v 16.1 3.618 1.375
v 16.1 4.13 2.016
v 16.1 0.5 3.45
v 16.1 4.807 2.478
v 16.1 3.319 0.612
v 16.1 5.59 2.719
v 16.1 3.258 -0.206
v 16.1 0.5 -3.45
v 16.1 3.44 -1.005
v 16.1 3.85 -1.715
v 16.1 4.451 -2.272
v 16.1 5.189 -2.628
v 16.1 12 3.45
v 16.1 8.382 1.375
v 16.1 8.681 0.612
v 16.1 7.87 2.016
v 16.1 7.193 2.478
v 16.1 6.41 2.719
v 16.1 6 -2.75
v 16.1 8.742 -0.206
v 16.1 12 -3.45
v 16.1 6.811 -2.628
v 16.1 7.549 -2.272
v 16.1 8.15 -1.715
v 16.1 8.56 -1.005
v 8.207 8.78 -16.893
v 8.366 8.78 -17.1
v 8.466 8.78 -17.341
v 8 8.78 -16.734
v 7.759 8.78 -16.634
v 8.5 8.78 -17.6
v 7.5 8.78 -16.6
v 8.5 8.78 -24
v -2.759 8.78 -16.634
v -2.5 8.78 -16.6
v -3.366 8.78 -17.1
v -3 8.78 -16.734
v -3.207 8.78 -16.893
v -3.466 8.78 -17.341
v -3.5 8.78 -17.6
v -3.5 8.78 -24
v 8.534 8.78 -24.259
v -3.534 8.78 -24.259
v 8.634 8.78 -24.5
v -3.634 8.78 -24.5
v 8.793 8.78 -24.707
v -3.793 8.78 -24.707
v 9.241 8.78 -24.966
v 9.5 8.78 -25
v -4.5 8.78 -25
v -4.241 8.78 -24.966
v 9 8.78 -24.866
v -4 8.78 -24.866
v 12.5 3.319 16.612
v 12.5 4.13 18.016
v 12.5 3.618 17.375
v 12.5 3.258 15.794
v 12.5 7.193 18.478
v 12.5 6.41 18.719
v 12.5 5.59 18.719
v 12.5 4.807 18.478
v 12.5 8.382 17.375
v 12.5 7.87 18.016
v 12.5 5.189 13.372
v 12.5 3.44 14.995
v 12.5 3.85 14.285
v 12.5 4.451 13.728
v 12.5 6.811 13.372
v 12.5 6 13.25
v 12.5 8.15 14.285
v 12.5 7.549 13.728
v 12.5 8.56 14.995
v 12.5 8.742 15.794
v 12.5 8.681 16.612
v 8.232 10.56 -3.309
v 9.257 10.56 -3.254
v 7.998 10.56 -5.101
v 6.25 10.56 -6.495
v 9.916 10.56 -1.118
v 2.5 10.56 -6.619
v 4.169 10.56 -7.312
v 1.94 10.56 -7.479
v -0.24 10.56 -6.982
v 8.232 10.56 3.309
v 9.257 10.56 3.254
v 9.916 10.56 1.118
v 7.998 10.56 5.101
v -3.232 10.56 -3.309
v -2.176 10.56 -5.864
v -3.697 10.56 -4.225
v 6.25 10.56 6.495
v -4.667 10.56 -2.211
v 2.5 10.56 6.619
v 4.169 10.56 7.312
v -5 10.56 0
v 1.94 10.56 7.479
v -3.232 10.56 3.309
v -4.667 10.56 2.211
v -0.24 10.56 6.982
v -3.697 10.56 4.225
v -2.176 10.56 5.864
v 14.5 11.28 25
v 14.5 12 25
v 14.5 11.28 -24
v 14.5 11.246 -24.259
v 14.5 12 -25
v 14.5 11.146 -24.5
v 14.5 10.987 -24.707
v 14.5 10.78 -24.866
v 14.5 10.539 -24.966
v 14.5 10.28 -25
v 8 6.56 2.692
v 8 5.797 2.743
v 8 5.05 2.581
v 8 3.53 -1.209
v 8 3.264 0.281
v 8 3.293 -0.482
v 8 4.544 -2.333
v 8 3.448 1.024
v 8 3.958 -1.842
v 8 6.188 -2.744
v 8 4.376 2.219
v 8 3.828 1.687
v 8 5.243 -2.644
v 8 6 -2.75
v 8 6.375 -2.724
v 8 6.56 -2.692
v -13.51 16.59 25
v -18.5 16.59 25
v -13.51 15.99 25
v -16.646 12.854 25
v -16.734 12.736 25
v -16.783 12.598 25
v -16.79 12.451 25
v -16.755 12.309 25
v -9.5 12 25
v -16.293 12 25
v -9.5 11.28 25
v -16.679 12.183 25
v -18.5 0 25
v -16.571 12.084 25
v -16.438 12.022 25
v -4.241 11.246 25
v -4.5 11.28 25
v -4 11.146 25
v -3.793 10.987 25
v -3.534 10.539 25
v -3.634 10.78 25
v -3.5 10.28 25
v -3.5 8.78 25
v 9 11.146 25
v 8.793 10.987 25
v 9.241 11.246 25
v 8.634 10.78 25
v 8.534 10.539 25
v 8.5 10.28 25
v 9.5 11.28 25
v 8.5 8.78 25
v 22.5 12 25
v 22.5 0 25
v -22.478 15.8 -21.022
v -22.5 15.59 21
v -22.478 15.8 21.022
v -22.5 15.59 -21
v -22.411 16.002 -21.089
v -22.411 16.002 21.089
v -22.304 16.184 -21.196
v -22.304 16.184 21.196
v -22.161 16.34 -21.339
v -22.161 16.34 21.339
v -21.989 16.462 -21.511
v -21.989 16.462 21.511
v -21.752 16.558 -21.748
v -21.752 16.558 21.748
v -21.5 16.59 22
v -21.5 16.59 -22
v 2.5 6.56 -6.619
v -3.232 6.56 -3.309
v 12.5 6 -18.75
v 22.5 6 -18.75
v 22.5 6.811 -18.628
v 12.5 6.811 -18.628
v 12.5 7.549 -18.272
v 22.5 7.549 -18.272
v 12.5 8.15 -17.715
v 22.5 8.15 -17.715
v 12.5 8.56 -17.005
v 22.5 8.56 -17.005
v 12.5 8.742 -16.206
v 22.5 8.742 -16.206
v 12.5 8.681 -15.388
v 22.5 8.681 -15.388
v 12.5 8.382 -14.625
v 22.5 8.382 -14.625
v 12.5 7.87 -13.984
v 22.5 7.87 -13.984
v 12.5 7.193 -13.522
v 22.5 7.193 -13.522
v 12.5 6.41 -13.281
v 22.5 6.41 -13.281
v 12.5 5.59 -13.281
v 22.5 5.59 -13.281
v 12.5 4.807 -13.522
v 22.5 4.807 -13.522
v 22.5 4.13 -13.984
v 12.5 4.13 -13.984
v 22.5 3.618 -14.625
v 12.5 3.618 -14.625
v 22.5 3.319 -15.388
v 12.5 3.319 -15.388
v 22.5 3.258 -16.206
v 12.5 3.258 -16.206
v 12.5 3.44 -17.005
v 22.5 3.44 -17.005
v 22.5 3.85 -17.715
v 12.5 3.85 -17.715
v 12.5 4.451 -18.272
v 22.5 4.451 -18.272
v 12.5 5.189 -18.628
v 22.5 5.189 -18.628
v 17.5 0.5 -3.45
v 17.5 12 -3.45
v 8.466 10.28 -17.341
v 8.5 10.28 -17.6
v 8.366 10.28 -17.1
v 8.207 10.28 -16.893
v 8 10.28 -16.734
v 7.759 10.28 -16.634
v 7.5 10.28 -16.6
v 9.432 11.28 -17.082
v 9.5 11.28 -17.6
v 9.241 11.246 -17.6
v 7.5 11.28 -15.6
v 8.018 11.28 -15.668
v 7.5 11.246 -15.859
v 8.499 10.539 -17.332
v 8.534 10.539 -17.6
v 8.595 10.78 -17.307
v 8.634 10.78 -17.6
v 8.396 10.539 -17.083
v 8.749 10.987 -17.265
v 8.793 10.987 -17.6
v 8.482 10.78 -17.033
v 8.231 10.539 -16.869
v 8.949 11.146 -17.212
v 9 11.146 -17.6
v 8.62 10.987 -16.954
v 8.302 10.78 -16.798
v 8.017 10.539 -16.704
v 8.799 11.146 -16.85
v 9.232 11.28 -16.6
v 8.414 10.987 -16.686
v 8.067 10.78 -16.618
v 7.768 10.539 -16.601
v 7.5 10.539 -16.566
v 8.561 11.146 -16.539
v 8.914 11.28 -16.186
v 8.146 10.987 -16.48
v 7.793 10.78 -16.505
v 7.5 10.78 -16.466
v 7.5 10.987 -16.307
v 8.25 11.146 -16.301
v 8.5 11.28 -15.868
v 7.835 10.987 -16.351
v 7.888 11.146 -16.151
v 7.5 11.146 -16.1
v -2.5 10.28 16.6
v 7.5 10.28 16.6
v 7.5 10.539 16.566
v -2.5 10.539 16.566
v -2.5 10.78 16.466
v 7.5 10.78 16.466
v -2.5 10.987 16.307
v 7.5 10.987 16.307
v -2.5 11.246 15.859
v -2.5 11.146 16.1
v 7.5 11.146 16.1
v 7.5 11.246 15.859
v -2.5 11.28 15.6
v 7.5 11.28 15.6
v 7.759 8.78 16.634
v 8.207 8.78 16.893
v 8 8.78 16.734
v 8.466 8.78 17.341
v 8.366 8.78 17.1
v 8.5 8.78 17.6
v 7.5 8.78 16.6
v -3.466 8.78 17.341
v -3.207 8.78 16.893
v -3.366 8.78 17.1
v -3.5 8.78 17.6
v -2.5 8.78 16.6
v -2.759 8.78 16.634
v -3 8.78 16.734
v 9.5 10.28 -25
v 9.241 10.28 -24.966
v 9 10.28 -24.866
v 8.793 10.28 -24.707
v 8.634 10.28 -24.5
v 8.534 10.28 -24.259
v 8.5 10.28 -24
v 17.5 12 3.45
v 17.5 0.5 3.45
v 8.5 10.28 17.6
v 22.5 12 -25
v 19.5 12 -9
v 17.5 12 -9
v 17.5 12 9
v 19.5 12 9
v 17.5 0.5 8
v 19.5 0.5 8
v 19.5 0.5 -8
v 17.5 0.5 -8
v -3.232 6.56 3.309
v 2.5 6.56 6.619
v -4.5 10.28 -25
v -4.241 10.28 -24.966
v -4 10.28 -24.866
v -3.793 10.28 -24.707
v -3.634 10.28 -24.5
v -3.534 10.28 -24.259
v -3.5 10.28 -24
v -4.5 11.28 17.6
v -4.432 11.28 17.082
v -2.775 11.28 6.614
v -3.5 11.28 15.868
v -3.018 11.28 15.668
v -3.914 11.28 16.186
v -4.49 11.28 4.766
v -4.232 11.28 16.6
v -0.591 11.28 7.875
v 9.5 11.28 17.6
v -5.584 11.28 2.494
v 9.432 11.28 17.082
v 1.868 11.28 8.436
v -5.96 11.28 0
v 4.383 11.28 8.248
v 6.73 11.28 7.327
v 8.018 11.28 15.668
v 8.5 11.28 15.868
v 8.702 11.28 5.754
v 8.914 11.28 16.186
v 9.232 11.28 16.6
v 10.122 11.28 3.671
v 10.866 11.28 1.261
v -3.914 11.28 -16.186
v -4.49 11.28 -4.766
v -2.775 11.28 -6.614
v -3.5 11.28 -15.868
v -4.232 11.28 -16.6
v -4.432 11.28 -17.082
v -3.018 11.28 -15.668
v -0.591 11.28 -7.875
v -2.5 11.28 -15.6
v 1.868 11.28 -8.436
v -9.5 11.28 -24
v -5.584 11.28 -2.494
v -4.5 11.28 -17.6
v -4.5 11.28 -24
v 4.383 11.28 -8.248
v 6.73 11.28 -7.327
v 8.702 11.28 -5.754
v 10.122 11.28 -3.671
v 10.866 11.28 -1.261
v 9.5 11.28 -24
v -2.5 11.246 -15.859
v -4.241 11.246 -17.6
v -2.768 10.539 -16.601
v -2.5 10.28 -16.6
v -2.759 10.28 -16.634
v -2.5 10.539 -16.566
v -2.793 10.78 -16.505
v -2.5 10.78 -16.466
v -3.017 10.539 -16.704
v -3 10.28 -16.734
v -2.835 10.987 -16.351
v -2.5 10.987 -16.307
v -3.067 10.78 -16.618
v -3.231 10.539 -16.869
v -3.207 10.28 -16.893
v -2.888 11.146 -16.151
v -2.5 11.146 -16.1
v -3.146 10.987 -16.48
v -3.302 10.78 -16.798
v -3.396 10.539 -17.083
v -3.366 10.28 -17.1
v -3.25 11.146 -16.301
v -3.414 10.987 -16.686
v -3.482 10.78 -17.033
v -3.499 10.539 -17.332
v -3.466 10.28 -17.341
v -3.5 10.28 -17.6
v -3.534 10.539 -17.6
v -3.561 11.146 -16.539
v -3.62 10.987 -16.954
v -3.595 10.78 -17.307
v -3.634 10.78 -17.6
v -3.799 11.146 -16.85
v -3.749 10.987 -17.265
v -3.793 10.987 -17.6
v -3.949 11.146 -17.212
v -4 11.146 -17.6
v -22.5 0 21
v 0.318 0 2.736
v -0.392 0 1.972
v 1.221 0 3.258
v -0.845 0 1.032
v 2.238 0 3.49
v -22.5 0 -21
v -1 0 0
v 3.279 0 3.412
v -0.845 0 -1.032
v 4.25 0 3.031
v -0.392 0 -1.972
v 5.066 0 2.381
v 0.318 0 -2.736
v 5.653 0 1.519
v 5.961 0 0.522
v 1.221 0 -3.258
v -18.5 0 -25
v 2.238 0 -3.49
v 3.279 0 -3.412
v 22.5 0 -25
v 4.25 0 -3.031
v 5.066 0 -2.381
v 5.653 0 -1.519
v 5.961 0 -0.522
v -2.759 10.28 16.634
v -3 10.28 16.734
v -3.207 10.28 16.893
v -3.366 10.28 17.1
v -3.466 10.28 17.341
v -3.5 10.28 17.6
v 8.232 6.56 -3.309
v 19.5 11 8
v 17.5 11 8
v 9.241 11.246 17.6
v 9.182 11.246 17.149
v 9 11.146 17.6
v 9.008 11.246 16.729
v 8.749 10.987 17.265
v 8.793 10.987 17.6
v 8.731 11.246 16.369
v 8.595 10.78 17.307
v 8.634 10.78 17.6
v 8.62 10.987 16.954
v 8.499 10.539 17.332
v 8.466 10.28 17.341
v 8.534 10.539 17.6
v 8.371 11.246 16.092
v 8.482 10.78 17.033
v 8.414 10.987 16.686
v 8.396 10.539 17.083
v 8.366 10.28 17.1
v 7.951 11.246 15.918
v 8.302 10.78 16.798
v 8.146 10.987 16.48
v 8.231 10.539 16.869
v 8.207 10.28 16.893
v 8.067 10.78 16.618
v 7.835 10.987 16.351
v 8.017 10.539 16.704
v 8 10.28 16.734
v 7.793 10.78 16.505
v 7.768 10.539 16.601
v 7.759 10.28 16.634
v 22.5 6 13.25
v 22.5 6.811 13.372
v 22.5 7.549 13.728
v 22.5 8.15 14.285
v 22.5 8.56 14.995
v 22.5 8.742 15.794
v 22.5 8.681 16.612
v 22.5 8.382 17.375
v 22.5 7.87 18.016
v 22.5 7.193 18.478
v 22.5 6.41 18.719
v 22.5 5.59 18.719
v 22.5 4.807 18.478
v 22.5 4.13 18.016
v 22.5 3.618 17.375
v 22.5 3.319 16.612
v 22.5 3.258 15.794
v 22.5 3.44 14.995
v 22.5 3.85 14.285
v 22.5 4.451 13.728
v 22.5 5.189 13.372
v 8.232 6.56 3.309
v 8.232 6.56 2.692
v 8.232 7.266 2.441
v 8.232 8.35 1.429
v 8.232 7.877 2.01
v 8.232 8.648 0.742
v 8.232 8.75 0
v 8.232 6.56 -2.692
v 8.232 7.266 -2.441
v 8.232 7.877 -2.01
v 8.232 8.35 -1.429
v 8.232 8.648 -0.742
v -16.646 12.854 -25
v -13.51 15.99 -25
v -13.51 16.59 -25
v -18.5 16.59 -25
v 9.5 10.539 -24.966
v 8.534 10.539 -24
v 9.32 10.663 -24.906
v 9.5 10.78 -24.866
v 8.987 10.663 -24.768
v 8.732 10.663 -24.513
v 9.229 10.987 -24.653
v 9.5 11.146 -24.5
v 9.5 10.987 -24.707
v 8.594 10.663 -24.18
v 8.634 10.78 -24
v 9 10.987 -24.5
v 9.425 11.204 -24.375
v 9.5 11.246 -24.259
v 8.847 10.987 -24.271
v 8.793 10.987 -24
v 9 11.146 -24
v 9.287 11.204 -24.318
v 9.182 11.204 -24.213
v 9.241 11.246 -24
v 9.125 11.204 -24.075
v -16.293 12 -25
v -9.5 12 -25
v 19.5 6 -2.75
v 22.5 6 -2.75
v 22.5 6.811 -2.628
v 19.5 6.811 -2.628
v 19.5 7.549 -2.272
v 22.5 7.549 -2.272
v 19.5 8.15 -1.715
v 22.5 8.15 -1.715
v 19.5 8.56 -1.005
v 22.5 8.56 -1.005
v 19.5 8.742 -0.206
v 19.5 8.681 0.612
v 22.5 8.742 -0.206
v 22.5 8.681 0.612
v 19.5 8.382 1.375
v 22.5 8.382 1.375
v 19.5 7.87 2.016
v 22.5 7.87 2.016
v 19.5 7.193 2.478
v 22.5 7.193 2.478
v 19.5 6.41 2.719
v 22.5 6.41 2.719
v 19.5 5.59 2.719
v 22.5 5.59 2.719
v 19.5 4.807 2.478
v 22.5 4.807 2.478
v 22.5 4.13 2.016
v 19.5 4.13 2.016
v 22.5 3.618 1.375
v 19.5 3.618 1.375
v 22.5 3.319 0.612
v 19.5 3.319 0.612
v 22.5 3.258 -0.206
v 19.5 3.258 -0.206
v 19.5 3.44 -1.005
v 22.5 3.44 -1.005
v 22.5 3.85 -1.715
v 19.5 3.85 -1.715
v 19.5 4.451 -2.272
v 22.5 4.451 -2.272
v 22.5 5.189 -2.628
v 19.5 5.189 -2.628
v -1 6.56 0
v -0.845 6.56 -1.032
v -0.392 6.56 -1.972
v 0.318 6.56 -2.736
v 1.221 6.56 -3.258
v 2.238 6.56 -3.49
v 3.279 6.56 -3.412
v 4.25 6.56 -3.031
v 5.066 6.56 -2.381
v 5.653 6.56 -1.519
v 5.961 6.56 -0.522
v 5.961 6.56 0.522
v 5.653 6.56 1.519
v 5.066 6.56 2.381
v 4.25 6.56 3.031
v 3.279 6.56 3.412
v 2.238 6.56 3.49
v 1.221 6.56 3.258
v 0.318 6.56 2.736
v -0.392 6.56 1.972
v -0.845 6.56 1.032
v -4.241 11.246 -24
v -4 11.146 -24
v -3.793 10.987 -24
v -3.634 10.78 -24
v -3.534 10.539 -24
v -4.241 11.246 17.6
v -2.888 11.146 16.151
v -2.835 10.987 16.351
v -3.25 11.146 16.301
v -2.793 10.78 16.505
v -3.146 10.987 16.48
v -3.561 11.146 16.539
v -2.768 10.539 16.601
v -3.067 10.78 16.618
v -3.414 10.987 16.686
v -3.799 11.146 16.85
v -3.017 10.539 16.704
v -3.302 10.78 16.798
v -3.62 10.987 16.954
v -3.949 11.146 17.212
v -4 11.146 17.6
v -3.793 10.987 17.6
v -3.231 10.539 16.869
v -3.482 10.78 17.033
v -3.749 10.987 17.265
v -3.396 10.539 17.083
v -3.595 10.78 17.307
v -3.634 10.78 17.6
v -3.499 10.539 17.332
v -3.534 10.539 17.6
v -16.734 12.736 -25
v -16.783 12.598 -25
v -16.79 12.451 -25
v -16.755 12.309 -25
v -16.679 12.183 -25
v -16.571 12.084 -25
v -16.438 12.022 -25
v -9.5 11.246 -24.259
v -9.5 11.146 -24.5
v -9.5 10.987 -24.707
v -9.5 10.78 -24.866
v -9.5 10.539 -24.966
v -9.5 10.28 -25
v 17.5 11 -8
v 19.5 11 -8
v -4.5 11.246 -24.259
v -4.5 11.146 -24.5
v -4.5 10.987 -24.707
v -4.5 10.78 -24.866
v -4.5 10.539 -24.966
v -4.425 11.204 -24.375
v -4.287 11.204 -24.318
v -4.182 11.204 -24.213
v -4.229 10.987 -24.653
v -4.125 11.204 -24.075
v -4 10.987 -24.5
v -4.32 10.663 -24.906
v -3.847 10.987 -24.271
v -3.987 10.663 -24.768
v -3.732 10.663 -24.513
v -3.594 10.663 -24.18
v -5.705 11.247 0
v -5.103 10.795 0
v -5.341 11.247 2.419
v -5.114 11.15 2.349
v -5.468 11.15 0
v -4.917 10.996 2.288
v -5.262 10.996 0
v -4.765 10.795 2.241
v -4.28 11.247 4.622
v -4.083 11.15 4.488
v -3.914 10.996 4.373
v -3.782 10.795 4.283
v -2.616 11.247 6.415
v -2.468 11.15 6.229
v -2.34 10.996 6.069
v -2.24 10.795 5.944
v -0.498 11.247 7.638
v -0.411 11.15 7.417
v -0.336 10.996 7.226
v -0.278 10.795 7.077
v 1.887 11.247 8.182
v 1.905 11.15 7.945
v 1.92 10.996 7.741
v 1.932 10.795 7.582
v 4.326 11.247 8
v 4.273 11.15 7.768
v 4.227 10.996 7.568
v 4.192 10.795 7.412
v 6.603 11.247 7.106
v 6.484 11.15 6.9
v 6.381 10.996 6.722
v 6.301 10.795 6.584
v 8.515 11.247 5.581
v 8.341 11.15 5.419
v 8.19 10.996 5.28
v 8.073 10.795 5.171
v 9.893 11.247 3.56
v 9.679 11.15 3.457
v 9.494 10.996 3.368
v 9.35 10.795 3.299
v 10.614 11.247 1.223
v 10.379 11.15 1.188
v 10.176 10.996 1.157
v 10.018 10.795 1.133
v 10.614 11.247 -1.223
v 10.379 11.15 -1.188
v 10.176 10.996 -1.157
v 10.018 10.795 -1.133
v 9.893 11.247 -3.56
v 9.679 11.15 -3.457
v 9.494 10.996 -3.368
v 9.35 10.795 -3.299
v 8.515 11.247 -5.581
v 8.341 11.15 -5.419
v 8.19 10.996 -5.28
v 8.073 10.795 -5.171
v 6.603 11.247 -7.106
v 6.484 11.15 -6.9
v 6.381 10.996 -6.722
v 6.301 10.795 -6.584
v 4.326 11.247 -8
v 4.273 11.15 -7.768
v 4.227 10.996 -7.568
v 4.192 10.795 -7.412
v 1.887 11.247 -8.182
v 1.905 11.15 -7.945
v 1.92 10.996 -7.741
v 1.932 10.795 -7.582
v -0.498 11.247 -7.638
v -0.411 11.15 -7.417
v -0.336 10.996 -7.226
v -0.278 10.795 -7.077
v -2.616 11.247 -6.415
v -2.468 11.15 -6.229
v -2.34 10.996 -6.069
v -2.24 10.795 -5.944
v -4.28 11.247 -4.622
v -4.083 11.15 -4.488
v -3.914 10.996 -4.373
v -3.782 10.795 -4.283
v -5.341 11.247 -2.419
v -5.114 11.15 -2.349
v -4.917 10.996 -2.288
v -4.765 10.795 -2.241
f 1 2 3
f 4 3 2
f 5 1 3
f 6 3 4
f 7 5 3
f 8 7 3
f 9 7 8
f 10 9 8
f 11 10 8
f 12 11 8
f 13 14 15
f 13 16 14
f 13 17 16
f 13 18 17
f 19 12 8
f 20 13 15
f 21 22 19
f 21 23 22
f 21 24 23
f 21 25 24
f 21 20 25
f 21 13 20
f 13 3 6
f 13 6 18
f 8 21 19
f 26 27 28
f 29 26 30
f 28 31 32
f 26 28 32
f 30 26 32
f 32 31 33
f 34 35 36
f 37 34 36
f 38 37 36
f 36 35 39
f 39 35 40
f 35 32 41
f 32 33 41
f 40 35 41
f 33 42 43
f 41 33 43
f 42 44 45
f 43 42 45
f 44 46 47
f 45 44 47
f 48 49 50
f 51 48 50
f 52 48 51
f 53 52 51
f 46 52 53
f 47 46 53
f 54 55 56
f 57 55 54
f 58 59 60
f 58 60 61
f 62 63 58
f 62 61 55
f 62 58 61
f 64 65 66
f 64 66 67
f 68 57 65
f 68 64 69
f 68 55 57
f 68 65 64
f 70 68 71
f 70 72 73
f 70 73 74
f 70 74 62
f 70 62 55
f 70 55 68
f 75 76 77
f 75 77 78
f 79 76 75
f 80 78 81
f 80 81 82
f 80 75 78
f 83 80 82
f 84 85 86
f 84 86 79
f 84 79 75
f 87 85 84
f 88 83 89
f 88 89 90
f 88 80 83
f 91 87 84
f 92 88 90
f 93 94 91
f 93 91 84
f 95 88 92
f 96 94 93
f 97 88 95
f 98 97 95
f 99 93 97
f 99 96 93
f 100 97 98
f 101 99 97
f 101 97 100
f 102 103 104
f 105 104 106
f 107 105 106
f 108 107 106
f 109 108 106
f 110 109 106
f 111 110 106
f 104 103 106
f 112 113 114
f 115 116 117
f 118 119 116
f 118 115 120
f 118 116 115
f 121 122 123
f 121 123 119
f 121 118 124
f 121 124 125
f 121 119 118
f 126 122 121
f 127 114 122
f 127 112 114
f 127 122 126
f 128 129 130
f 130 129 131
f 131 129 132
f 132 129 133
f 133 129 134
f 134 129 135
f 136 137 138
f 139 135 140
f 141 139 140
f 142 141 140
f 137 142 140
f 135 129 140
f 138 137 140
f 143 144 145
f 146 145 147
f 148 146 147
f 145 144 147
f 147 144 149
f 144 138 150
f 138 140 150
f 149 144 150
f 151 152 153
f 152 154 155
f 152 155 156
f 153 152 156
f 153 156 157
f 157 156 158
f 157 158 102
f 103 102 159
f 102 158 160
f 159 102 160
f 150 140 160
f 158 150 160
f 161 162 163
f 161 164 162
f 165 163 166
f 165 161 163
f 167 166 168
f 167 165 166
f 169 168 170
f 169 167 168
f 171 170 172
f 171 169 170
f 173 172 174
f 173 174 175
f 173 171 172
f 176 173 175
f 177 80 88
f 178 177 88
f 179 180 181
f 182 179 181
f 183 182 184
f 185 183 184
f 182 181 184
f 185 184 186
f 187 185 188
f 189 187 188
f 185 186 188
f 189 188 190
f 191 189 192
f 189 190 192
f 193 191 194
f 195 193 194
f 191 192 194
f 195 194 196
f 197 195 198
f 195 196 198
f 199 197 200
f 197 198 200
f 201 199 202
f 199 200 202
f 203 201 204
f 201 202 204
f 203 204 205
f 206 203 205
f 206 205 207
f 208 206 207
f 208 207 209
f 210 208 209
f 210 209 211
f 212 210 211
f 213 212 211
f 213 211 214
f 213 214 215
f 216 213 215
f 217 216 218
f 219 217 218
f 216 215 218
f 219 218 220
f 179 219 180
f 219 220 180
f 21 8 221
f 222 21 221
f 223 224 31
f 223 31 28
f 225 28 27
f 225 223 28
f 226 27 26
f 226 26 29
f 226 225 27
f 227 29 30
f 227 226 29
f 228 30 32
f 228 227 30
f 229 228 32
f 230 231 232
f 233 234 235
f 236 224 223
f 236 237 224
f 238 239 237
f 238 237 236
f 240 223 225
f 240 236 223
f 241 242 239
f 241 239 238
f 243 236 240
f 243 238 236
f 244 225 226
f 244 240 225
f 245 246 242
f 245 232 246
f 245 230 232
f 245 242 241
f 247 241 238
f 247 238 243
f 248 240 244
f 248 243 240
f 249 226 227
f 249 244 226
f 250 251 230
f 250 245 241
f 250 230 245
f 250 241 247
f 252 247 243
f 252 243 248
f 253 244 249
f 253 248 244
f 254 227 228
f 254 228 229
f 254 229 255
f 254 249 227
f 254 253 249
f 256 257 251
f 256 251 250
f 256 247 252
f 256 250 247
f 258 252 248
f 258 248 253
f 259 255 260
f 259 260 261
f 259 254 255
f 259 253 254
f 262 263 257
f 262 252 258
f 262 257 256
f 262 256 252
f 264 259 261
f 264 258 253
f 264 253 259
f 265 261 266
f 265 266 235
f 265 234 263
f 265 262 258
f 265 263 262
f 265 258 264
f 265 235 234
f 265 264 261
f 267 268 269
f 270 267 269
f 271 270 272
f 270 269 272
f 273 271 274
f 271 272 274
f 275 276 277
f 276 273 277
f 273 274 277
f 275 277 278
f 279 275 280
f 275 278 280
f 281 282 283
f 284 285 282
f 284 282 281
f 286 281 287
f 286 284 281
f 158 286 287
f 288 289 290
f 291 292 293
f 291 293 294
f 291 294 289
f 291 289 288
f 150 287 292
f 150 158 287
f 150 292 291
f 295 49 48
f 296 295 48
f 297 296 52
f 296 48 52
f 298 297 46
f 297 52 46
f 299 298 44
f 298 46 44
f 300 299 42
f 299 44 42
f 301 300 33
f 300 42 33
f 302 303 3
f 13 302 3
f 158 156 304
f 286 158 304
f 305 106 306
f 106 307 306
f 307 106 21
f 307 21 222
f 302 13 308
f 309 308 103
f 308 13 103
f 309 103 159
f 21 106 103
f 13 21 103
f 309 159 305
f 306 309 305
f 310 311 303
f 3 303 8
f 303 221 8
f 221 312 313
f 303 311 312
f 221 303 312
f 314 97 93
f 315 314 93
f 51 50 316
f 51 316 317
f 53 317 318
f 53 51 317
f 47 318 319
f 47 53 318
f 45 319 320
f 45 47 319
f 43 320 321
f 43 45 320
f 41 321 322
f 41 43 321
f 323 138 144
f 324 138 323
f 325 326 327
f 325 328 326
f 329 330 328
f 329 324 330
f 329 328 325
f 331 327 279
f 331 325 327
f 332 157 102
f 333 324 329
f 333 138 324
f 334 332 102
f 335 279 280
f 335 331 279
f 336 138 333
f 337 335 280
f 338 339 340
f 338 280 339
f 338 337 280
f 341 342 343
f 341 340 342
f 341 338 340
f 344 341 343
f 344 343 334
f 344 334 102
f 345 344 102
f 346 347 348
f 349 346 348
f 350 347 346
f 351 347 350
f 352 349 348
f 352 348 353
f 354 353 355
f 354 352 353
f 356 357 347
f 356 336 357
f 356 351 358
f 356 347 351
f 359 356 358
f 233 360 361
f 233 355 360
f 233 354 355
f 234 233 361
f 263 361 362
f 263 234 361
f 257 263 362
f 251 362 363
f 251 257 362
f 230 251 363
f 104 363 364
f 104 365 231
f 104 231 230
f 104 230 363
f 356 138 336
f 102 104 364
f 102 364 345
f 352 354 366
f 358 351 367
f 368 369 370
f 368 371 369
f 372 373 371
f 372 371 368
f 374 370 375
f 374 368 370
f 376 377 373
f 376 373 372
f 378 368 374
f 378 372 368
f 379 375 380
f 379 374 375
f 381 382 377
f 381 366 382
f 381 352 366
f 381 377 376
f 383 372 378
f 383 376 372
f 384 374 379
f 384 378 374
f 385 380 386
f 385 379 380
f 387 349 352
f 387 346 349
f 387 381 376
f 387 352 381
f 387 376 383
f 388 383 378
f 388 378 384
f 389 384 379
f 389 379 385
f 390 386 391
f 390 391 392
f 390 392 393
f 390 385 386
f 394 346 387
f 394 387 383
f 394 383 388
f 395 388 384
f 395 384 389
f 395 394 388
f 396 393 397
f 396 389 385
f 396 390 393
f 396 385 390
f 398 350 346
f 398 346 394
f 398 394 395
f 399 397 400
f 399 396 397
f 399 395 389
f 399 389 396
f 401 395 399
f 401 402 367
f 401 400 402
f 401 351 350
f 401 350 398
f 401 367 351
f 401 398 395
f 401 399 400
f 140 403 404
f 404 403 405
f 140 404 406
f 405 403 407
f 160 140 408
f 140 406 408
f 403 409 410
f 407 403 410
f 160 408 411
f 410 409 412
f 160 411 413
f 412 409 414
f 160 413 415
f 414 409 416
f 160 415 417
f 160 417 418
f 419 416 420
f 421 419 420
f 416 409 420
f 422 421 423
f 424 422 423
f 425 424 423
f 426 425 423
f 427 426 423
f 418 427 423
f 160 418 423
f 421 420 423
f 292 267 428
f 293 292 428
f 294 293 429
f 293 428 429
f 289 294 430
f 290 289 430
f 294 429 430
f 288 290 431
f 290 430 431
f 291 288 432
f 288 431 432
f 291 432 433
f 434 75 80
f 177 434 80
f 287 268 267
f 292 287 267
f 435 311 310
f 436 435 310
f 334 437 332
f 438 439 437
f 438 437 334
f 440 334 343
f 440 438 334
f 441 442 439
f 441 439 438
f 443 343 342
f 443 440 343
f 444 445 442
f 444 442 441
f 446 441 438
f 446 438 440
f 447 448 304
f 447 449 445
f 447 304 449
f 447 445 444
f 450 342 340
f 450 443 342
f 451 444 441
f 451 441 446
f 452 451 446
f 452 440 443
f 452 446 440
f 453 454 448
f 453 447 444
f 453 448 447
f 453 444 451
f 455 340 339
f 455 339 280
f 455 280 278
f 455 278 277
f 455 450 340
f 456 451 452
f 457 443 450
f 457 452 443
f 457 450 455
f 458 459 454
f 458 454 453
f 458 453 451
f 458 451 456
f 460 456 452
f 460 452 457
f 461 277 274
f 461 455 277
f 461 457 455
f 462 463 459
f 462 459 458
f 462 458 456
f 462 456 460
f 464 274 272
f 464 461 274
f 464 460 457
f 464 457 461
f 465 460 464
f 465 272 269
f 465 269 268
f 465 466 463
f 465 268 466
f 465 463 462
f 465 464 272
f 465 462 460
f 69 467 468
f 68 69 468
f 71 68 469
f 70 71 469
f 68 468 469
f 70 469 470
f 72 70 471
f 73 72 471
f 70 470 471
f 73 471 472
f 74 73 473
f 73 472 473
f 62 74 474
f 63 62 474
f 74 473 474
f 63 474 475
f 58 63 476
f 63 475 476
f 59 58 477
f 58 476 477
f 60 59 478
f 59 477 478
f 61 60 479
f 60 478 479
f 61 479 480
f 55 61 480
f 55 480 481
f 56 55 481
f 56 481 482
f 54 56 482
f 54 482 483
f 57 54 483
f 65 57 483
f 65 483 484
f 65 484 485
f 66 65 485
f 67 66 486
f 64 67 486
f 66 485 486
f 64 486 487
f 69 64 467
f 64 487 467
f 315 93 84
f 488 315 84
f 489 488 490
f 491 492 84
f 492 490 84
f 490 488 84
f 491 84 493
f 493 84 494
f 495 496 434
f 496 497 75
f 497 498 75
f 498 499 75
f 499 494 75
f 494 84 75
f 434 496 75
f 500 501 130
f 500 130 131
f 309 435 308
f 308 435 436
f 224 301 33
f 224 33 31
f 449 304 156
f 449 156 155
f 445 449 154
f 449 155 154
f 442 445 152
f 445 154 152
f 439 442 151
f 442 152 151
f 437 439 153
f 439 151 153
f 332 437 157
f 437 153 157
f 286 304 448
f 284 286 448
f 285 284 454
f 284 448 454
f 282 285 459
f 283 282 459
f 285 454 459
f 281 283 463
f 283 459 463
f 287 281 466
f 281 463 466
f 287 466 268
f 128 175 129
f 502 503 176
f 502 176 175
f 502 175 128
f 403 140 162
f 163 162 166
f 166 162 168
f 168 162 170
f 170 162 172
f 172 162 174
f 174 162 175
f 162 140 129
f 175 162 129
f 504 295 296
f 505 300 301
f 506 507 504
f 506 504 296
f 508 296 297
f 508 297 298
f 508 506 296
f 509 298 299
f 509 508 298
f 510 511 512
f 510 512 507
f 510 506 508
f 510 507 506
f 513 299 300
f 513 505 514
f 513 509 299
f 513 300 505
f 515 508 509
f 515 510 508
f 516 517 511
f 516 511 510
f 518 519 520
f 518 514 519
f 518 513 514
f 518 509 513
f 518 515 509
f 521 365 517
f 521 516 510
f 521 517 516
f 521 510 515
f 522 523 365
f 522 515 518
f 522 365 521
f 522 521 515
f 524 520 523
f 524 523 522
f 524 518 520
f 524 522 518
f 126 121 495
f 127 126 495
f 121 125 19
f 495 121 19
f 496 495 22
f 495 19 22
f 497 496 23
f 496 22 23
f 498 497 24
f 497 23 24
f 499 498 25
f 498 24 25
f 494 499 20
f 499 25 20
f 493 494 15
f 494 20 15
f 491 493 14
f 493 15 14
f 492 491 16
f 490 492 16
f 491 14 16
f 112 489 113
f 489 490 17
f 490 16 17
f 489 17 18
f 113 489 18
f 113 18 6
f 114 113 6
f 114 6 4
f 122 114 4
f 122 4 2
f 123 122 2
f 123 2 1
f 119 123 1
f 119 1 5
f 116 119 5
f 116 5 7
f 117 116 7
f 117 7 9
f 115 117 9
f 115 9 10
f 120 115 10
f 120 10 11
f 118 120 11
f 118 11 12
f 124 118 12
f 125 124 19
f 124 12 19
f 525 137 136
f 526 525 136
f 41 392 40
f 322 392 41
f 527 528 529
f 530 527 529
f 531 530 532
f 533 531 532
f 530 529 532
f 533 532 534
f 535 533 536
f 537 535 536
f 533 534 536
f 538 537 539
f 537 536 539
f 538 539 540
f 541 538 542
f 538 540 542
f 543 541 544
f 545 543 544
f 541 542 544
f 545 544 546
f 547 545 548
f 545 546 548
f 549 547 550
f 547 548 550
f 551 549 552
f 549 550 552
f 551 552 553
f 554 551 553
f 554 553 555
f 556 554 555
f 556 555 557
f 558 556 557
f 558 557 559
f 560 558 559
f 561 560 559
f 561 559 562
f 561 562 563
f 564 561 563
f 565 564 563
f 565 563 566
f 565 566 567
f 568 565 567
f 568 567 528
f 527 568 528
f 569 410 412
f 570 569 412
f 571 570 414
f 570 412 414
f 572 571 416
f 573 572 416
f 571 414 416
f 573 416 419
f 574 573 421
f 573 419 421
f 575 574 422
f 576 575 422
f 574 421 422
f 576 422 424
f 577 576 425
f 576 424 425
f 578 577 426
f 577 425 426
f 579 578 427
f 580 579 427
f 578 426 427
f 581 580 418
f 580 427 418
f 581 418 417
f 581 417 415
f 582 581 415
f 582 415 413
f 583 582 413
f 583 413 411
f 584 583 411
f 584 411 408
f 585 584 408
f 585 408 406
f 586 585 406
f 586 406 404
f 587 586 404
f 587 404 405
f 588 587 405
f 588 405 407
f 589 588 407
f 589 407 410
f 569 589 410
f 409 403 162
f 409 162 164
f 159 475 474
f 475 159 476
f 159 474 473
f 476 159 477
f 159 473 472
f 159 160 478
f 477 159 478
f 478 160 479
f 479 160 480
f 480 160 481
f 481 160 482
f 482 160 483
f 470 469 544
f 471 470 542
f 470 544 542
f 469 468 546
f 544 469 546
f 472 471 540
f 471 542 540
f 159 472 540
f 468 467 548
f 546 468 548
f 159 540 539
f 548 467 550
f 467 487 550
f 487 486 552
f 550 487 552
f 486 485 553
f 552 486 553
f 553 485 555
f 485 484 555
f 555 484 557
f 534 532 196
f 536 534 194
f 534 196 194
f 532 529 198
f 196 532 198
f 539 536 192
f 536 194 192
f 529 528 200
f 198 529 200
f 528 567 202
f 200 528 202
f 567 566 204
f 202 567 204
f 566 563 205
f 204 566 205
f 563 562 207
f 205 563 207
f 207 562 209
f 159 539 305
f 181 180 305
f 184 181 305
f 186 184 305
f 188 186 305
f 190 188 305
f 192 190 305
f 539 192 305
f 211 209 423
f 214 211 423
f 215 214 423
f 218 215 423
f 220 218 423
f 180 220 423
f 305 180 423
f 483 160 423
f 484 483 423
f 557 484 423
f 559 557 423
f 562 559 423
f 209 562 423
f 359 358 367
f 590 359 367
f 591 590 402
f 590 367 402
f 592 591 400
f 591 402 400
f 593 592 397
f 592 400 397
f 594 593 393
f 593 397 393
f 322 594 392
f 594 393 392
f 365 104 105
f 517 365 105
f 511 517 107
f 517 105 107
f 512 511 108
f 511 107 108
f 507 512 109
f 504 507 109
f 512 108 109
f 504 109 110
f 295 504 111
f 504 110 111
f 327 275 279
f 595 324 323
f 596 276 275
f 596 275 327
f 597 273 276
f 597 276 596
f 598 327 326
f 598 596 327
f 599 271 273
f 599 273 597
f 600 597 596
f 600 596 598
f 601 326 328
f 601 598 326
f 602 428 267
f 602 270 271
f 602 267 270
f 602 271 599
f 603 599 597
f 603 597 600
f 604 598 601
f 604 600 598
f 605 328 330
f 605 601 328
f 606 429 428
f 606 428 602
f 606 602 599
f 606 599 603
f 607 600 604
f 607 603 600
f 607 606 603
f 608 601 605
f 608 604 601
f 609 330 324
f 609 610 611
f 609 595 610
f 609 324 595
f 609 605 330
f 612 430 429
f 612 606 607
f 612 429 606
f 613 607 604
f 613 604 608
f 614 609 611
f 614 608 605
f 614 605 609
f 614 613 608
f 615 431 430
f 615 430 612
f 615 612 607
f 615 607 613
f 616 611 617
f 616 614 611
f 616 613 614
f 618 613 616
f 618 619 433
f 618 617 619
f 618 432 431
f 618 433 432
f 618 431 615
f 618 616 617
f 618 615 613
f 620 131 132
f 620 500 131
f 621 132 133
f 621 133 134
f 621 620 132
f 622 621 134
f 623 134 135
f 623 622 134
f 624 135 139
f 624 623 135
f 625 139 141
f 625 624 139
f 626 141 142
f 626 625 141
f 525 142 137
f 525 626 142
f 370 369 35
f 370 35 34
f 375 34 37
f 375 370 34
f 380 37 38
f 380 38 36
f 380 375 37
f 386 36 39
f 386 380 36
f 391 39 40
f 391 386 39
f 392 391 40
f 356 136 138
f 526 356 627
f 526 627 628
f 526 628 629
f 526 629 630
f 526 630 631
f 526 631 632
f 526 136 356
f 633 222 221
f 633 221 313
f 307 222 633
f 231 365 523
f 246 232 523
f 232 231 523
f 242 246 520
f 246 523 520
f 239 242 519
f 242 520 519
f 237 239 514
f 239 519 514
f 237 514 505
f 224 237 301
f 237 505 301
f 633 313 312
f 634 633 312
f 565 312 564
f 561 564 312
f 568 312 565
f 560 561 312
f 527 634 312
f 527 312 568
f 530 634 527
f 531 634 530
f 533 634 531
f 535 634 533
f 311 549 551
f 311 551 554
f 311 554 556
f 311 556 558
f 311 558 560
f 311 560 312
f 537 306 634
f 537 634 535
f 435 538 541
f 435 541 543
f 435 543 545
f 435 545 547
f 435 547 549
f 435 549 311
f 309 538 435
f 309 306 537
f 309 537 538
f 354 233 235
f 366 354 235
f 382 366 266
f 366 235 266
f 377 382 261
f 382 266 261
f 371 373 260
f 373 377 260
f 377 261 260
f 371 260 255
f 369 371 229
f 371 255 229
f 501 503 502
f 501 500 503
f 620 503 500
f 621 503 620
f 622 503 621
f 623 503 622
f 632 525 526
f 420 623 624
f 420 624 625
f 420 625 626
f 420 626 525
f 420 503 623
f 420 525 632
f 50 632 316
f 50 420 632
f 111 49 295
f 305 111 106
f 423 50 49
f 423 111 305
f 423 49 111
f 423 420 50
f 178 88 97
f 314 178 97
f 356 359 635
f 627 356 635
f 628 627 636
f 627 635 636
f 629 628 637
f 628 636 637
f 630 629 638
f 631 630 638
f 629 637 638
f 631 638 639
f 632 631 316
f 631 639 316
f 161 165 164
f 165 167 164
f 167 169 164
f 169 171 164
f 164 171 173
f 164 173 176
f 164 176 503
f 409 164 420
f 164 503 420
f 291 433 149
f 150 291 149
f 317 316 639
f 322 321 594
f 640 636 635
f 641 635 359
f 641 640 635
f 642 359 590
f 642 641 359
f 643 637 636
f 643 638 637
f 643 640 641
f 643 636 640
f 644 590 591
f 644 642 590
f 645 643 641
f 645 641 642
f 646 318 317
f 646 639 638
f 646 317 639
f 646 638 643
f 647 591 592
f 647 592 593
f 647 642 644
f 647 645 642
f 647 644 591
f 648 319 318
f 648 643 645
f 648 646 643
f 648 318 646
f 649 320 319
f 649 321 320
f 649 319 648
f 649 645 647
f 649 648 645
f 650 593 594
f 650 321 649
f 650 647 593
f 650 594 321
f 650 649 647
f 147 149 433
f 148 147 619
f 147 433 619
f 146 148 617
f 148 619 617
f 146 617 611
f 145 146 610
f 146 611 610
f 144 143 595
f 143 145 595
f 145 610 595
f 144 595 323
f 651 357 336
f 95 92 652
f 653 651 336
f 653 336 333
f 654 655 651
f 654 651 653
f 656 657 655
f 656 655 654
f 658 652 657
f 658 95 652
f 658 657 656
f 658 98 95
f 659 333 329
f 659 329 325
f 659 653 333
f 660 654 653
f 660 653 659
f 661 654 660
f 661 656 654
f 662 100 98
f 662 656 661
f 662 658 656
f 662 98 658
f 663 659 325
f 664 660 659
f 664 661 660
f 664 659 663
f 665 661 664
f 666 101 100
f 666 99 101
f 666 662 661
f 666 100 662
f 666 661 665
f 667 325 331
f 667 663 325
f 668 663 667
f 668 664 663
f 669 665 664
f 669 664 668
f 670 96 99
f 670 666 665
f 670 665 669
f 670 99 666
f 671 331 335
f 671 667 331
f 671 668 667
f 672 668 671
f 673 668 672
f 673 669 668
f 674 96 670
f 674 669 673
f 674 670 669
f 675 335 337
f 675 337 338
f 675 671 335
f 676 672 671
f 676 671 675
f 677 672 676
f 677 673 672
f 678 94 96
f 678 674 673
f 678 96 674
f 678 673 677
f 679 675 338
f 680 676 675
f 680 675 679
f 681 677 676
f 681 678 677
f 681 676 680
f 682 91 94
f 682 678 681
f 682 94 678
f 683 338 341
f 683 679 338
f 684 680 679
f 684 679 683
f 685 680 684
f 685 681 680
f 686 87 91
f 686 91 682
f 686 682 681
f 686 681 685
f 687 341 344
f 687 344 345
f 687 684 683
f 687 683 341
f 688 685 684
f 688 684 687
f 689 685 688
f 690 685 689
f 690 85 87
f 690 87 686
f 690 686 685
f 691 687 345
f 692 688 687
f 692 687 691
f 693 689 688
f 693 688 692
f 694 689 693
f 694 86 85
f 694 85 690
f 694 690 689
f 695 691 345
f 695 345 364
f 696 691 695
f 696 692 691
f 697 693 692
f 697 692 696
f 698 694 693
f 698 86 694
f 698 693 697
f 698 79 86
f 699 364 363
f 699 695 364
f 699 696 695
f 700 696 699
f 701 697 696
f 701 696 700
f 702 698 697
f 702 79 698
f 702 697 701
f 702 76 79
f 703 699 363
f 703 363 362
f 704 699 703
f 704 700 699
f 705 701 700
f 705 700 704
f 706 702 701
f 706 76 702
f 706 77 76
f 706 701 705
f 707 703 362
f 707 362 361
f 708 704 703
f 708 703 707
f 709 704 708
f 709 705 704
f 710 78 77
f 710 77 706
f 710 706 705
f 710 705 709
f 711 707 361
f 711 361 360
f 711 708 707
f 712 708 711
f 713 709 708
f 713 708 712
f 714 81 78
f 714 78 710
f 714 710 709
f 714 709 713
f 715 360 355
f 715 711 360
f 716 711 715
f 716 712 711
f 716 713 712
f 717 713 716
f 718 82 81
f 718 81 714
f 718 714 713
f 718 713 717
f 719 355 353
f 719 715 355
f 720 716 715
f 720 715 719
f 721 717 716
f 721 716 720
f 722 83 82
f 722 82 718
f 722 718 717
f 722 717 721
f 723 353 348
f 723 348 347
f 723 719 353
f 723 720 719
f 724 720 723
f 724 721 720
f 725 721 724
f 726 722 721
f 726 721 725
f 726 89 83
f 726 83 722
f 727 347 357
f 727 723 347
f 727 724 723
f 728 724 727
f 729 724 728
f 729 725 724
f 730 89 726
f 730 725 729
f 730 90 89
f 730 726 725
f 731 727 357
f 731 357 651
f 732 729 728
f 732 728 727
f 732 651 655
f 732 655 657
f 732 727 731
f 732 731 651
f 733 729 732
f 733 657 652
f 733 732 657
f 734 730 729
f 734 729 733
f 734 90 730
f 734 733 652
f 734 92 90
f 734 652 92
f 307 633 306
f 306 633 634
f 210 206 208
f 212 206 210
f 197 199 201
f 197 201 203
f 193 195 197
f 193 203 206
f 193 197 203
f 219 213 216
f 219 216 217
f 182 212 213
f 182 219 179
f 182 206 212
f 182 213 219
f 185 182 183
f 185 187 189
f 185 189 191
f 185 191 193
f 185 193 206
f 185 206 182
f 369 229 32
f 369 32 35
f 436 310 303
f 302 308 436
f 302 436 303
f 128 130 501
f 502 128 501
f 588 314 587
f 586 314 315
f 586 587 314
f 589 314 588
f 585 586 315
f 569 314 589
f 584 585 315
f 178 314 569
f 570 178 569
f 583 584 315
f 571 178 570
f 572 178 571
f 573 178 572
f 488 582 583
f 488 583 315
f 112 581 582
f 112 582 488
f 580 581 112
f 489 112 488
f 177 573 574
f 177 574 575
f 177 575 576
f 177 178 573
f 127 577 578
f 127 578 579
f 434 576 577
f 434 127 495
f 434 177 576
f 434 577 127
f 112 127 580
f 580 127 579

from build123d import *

# Parameters (mm, degrees)
SKETCH1_W            = 45
SKETCH1_H            = 50
BOSS_EXTRUDE1_DEPTH  = 16
CUT_EXTRUDE1_DEPTH   = 58.116109812
SKETCH4_W            = 24
SKETCH4_H            = 50
CUT_EXTRUDE2_DEPTH   = 0.72
CUT_EXTRUDE3_DEPTH   = 58.116109812
SKETCH8_R            = 7.5
CUT_EXTRUDE4_DEPTH   = 0.72
M6_CLEARANCE_HOLE2_D = 7
CUT_EXTRUDE5_DEPTH   = 2.5
FILLET1_R            = 1
FILLET2_R            = 1
FILLET4_R            = 0.5
CUT_EXTRUDE7_DEPTH   = 11.5
SKETCH18_R           = 2.75
CUT_EXTRUDE8_DEPTH   = 14.5
SKETCH19_R           = 2.75
CUT_EXTRUDE9_DEPTH   = 10
SKETCH21_W           = 8.99
SKETCH21_H           = 50
BOSS_EXTRUDE2_DEPTH  = 0.6
CHAMFER1_SIZE        = 4
FILLET5_R            = 1
CUT_EXTRUDE11_DEPTH  = 4
CHAMFER2_SIZE        = 1


with BuildPart() as part:
    # Sketch1 → Boss-Extrude1 (new body)
    with BuildSketch(Plane(origin=(0, 0, 0), x_dir=(1, 0, 0), z_dir=(0, 1, 0))):
        Rectangle(SKETCH1_W, SKETCH1_H)
    extrude(amount=BOSS_EXTRUDE1_DEPTH)

    # Sketch3 → Cut-Extrude1 (cut, through all)
    with BuildSketch(Plane.XY.offset(25)):
        Polygon((-13.5, 16), (-17.5, 12), (22.5, 12), (22.5, 16), align=None)
    extrude(amount=-CUT_EXTRUDE1_DEPTH, mode=Mode.SUBTRACT)

    # Sketch4 → Cut-Extrude2 (cut)
    with BuildSketch(Plane(origin=(0, 12, 0), x_dir=(1, 0, 0), z_dir=(0, 1, 0))):
        with Locations((2.5, 0)):
            Rectangle(SKETCH4_W, SKETCH4_H)
    extrude(amount=-CUT_EXTRUDE2_DEPTH, mode=Mode.SUBTRACT)

    # Sketch5 → Cut-Extrude3 (cut, through all)
    with BuildSketch(Plane.XY.offset(25)):
        Polygon((-22.5, 16), (-13.5, 16), (-13.51, 15.99), (-22.5, 15.99), align=None)
    extrude(amount=-CUT_EXTRUDE3_DEPTH, mode=Mode.SUBTRACT)

    # Sketch8 → Cut-Extrude4 (cut)
    with BuildSketch(Plane(origin=(0, 11.28, 0), x_dir=(1, 0, 0), z_dir=(0, 1, 0))):
        with Locations(Location((2.5, 0, 0), (0, 0, 180))):
            Circle(SKETCH8_R)
    extrude(amount=-CUT_EXTRUDE4_DEPTH, mode=Mode.SUBTRACT)

    # M6 Clearance Hole2 (through all)
    with Locations(Plane(origin=(0, 10.56, 0), x_dir=(1, 0, 0), z_dir=(0, 1, 0))):
        with Locations((2.5, 0)):
            Hole(M6_CLEARANCE_HOLE2_D / 2)

    # Sketch12 → Cut-Extrude5 (cut)
    with BuildSketch(Plane(origin=(0, 11.28, 0), x_dir=(1, 0, 0), z_dir=(0, 1, 0))):
        with BuildLine():
            Line((7.5, 16.6), (-2.5, 16.6))
            ThreePointArc((-2.5, 16.6), (-3.207106781, 16.892893219), (-3.5, 17.6))
            Line((-3.5, 17.6), (-3.5, 25))
            Line((-3.5, 25), (8.5, 25))
            Line((8.5, 25), (8.5, 17.6))
            ThreePointArc((8.5, 17.6), (8.207106781, 16.892893219), (7.5, 16.6))
        make_face()
    cut_extrude5 = extrude(amount=-CUT_EXTRUDE5_DEPTH, mode=Mode.SUBTRACT)

    # Fillet1
    fillet1_edges = [part.edges().sort_by_distance(p)[0] for p in [
        (-3.5, 10.03, -25),
        (8.5, 10.03, -25),
    ]]
    fillet(fillet1_edges, radius=FILLET1_R)

    # Mirror2: Cut-Extrude5 across plane
    add(cut_extrude5.mirror(Plane.XY), mode=Mode.SUBTRACT)

    # Fillet2
    # the kernel refuses this fillet: 1 mm, written as the material it takes off along each edge
    with BuildSketch(Plane(origin=(7.5, 11.28, 17.6), x_dir=(1, 0, 0), z_dir=(0, 0, 1))) as fillet2_piece_1:
        with BuildLine():
            CenterArc((1 + FILLET2_R, -FILLET2_R), FILLET2_R, 90, 90)
            Line((1, -FILLET2_R), (1 - FILLET2_R * 0.02, -FILLET2_R))
            Line((1 - FILLET2_R * 0.02, -FILLET2_R), (1 - FILLET2_R * 0.02, FILLET2_R * 0.02))
            Line((1 - FILLET2_R * 0.02, FILLET2_R * 0.02), (1 + FILLET2_R, FILLET2_R * 0.02))
            Line((1 + FILLET2_R, FILLET2_R * 0.02), (1 + FILLET2_R, 0))
        make_face()
    revolve(axis=Axis((7.5, 11.28, 17.6), (0, 1, 0)), revolution_arc=90, mode=Mode.SUBTRACT)
    with BuildSketch(Plane(origin=(8.5, 11.28, 27.5), x_dir=(1, 0, 0), z_dir=(0, 0, -1)), Plane(origin=(-3.5, 11.28, 17.6), x_dir=(-1, 0, 0), z_dir=(0, 0, 1))) as fillet2_piece_2:
        with BuildLine():
            CenterArc((FILLET2_R, FILLET2_R), FILLET2_R, 180, 90)
            Line((0, FILLET2_R), (-FILLET2_R * 0.02, FILLET2_R))
            Line((-FILLET2_R * 0.02, FILLET2_R), (-FILLET2_R * 0.02, -FILLET2_R * 0.02))
            Line((-FILLET2_R * 0.02, -FILLET2_R * 0.02), (FILLET2_R, -FILLET2_R * 0.02))
            Line((FILLET2_R, -FILLET2_R * 0.02), (FILLET2_R, 0))
        make_face()
    extrude(amount=9.9, mode=Mode.SUBTRACT)
    with BuildSketch(Plane(origin=(-2.5, 11.28, 17.6), x_dir=(0, 0, -1), z_dir=(1, 0, 0))) as fillet2_piece_3:
        with BuildLine():
            CenterArc((1 + FILLET2_R, -FILLET2_R), FILLET2_R, 90, 90)
            Line((1, -FILLET2_R), (1 - FILLET2_R * 0.02, -FILLET2_R))
            Line((1 - FILLET2_R * 0.02, -FILLET2_R), (1 - FILLET2_R * 0.02, FILLET2_R * 0.02))
            Line((1 - FILLET2_R * 0.02, FILLET2_R * 0.02), (1 + FILLET2_R, FILLET2_R * 0.02))
            Line((1 + FILLET2_R, FILLET2_R * 0.02), (1 + FILLET2_R, 0))
        make_face()
    revolve(axis=Axis((-2.5, 11.28, 17.6), (0, 1, 0)), revolution_arc=90, mode=Mode.SUBTRACT)
    with BuildSketch(Plane(origin=(7.5, 11.28, 16.6), x_dir=(0, 0, -1), z_dir=(-1, 0, 0))) as fillet2_piece_4:
        with BuildLine():
            CenterArc((FILLET2_R, FILLET2_R), FILLET2_R, 180, 90)
            Line((0, FILLET2_R), (-FILLET2_R * 0.02, FILLET2_R))
            Line((-FILLET2_R * 0.02, FILLET2_R), (-FILLET2_R * 0.02, -FILLET2_R * 0.02))
            Line((-FILLET2_R * 0.02, -FILLET2_R * 0.02), (FILLET2_R, -FILLET2_R * 0.02))
            Line((FILLET2_R, -FILLET2_R * 0.02), (FILLET2_R, 0))
        make_face()
    extrude(amount=10, mode=Mode.SUBTRACT)
    with BuildSketch(Plane(origin=(-4.5, 11.28, -25), x_dir=(0, 0, 1), z_dir=(-1, 0, 0)), Plane(origin=(14.5, 11.28, -25), x_dir=(0, 0, 1), z_dir=(-1, 0, 0))) as fillet2_piece_5:
        with BuildLine():
            CenterArc((FILLET2_R, -FILLET2_R), FILLET2_R, 90, 90)
            Line((0, -FILLET2_R), (-FILLET2_R * 0.02, -FILLET2_R))
            Line((-FILLET2_R * 0.02, -FILLET2_R), (-FILLET2_R * 0.02, FILLET2_R * 0.02))
            Line((-FILLET2_R * 0.02, FILLET2_R * 0.02), (FILLET2_R, FILLET2_R * 0.02))
            Line((FILLET2_R, FILLET2_R * 0.02), (FILLET2_R, 0))
        make_face()
    extrude(amount=5, mode=Mode.SUBTRACT)
    with BuildSketch(Plane(origin=(2.5, 11.28, 0), x_dir=(-1, 0, 0), z_dir=(0, 0, -1))) as fillet2_piece_6:
        with BuildLine():
            CenterArc((8.46, -1), FILLET2_R, 90, 73.739795292)
            Line((7.5, -0.72), (7.4808, -0.7144))
            ThreePointArc((7.4808, -0.7144), (7.48, -0.36), (7.48, 0))
            Line((7.48, 0), (7.5, 0.02))
            Line((7.5, 0.02), (8.46, 0.02))
            Line((8.46, 0.02), (8.46, 0))
        make_face()
    revolve(axis=Axis((2.5, 11.28, 0), (0, 1, 0)), mode=Mode.SUBTRACT)
    with BuildSketch(Plane(origin=(7.5, 11.28, -17.6), x_dir=(1, 0, 0), z_dir=(0, 0, -1))) as fillet2_piece_7:
        with BuildLine():
            CenterArc((1 + FILLET2_R, FILLET2_R), FILLET2_R, 180, 90)
            Line((1, FILLET2_R), (1 - FILLET2_R * 0.02, FILLET2_R))
            Line((1 - FILLET2_R * 0.02, FILLET2_R), (1 - FILLET2_R * 0.02, -FILLET2_R * 0.02))
            Line((1 - FILLET2_R * 0.02, -FILLET2_R * 0.02), (1 + FILLET2_R, -FILLET2_R * 0.02))
            Line((1 + FILLET2_R, -FILLET2_R * 0.02), (1 + FILLET2_R, 0))
        make_face()
    revolve(axis=Axis((7.5, 11.28, -17.6), (0, -1, 0)), revolution_arc=90, mode=Mode.SUBTRACT)
    with BuildSketch(Plane(origin=(8.5, 11.28, -24), x_dir=(1, 0, 0), z_dir=(0, 0, 1)), Plane(origin=(-3.5, 11.28, -17.6), x_dir=(-1, 0, 0), z_dir=(0, 0, -1))) as fillet2_piece_8:
        with BuildLine():
            CenterArc((FILLET2_R, -FILLET2_R), FILLET2_R, 90, 90)
            Line((0, -FILLET2_R), (-FILLET2_R * 0.02, -FILLET2_R))
            Line((-FILLET2_R * 0.02, -FILLET2_R), (-FILLET2_R * 0.02, FILLET2_R * 0.02))
            Line((-FILLET2_R * 0.02, FILLET2_R * 0.02), (FILLET2_R, FILLET2_R * 0.02))
            Line((FILLET2_R, FILLET2_R * 0.02), (FILLET2_R, 0))
        make_face()
    extrude(amount=6.4, mode=Mode.SUBTRACT)
    with BuildSketch(Plane(origin=(-2.5, 11.28, -17.6), x_dir=(0, 0, 1), z_dir=(1, 0, 0))) as fillet2_piece_9:
        with BuildLine():
            CenterArc((1 + FILLET2_R, FILLET2_R), FILLET2_R, 180, 90)
            Line((1, FILLET2_R), (1 - FILLET2_R * 0.02, FILLET2_R))
            Line((1 - FILLET2_R * 0.02, FILLET2_R), (1 - FILLET2_R * 0.02, -FILLET2_R * 0.02))
            Line((1 - FILLET2_R * 0.02, -FILLET2_R * 0.02), (1 + FILLET2_R, -FILLET2_R * 0.02))
            Line((1 + FILLET2_R, -FILLET2_R * 0.02), (1 + FILLET2_R, 0))
        make_face()
    revolve(axis=Axis((-2.5, 11.28, -17.6), (0, -1, 0)), revolution_arc=90, mode=Mode.SUBTRACT)
    with BuildSketch(Plane(origin=(7.5, 11.28, -16.6), x_dir=(0, 0, 1), z_dir=(-1, 0, 0))) as fillet2_piece_10:
        with BuildLine():
            CenterArc((FILLET2_R, -FILLET2_R), FILLET2_R, 90, 90)
            Line((0, -FILLET2_R), (-FILLET2_R * 0.02, -FILLET2_R))
            Line((-FILLET2_R * 0.02, -FILLET2_R), (-FILLET2_R * 0.02, FILLET2_R * 0.02))
            Line((-FILLET2_R * 0.02, FILLET2_R * 0.02), (FILLET2_R, FILLET2_R * 0.02))
            Line((FILLET2_R, FILLET2_R * 0.02), (FILLET2_R, 0))
        make_face()
    extrude(amount=10, mode=Mode.SUBTRACT)
    with BuildSketch(Plane(origin=(-4.5, 11.28, -24), x_dir=(0, 0, -1), z_dir=(-1, 0, 0))) as fillet2_piece_11:
        with BuildLine():
            CenterArc((1 - FILLET2_R, FILLET2_R), FILLET2_R, 270, 90)
            Line((1, FILLET2_R), (1 + FILLET2_R * 0.02, FILLET2_R))
            Line((1 + FILLET2_R * 0.02, FILLET2_R), (1 + FILLET2_R * 0.02, 0))
            Line((1 + FILLET2_R * 0.02, 0), (1, -FILLET2_R * 0.02))
            Line((1, -FILLET2_R * 0.02), (1 - FILLET2_R, -FILLET2_R * 0.02))
            Line((1 - FILLET2_R, -FILLET2_R * 0.02), (1 - FILLET2_R, 0))
        make_face()
    revolve(axis=Axis((-4.5, 11.28, -24), (0, -1, 0)), revolution_arc=90, mode=Mode.SUBTRACT)
    with BuildSketch(Plane(origin=(9.5, 11.28, -24), x_dir=(0, 0, -1), z_dir=(1, 0, 0))) as fillet2_piece_12:
        with BuildLine():
            CenterArc((1 - FILLET2_R, -FILLET2_R), FILLET2_R, 0, 90)
            Line((1, -FILLET2_R), (1 + FILLET2_R * 0.02, -FILLET2_R))
            Line((1 + FILLET2_R * 0.02, -FILLET2_R), (1 + FILLET2_R * 0.02, 0))
            Line((1 + FILLET2_R * 0.02, 0), (1, FILLET2_R * 0.02))
            Line((1, FILLET2_R * 0.02), (1 - FILLET2_R, FILLET2_R * 0.02))
            Line((1 - FILLET2_R, FILLET2_R * 0.02), (1 - FILLET2_R, 0))
        make_face()
    revolve(axis=Axis((9.5, 11.28, -24), (0, 1, 0)), revolution_arc=90, mode=Mode.SUBTRACT)

    # Fillet4
    fillet4_edges = [part.edges().sort_by_distance(p)[0] for p in [
        (-17.5, 12, 0),
    ]]
    fillet(fillet4_edges, radius=FILLET4_R)

    # Sketch14 → Cut-Extrude7 (cut)
    with BuildSketch(Plane(origin=(0, 12, 0), x_dir=(1, 0, 0), z_dir=(0, 1, 0))):
        Polygon((19.5, -8), (17.5, -8), (17.5, -3.45), (16.1, -3.45), (16.1, 3.45), (17.5, 3.45), (17.5, 8), (19.5, 8), align=None)
    extrude(amount=-CUT_EXTRUDE7_DEPTH, mode=Mode.SUBTRACT)

    # Sketch18 → Cut-Extrude8 (cut)
    with BuildSketch(Plane(origin=(22.5, 0, 0), x_dir=(0, 0, -1), z_dir=(1, 0, 0))):
        with Locations((0, 6)):
            Circle(SKETCH18_R)
    extrude(amount=-CUT_EXTRUDE8_DEPTH, mode=Mode.SUBTRACT)

    # Sketch19 → Cut-Extrude9 (cut)
    with BuildSketch(Plane(origin=(22.5, 0, 0), x_dir=(0, 0, -1), z_dir=(1, 0, 0))):
        with Locations((-16, 6)):
            Circle(SKETCH19_R)
        with Locations((16, 6)):
            Circle(SKETCH19_R)
    extrude(amount=-CUT_EXTRUDE9_DEPTH, mode=Mode.SUBTRACT)

    # Sketch21 → Boss-Extrude2 (add)
    with BuildSketch(Plane(origin=(0, 15.99, 0), x_dir=(1, 0, 0), z_dir=(0, 1, 0))):
        with Locations((-18.005, 0)):
            Rectangle(SKETCH21_W, SKETCH21_H)
    extrude(amount=BOSS_EXTRUDE2_DEPTH)

    # Chamfer1
    chamfer1_edges = [part.edges().sort_by_distance(p)[0] for p in [
        (-22.5, 8.295, 25),
        (-22.5, 8.295, -25),
    ]]
    chamfer(chamfer1_edges, length=CHAMFER1_SIZE)

    # Fillet5
    fillet5_edges = [part.edges().sort_by_distance(p)[0] for p in [
        (-22.5, 16.59, 0),
    ]]
    fillet(fillet5_edges, radius=FILLET5_R)

    # Sketch23 → Cut-Extrude11 (cut)
    with BuildSketch(Plane(origin=(0, 10.56, 0), x_dir=(1, 0, 0), z_dir=(0, 1, 0))):
        Polygon((2.5, 6.618818118), (-3.232064633, 3.309409059), (-3.232064633, -3.309409059), (2.5, -6.618818118), (8.232064633, -3.309409059), (8.232064633, 3.309409059), align=None)
    extrude(amount=-CUT_EXTRUDE11_DEPTH, mode=Mode.SUBTRACT)

    # Chamfer2
    chamfer2_edges = [part.edges().sort_by_distance(p)[0] for p in [
        (18.5, 12, 8),
        (18.5, 12, -8),
    ]]
    chamfer(chamfer2_edges, length=CHAMFER2_SIZE)


solid = part.part
